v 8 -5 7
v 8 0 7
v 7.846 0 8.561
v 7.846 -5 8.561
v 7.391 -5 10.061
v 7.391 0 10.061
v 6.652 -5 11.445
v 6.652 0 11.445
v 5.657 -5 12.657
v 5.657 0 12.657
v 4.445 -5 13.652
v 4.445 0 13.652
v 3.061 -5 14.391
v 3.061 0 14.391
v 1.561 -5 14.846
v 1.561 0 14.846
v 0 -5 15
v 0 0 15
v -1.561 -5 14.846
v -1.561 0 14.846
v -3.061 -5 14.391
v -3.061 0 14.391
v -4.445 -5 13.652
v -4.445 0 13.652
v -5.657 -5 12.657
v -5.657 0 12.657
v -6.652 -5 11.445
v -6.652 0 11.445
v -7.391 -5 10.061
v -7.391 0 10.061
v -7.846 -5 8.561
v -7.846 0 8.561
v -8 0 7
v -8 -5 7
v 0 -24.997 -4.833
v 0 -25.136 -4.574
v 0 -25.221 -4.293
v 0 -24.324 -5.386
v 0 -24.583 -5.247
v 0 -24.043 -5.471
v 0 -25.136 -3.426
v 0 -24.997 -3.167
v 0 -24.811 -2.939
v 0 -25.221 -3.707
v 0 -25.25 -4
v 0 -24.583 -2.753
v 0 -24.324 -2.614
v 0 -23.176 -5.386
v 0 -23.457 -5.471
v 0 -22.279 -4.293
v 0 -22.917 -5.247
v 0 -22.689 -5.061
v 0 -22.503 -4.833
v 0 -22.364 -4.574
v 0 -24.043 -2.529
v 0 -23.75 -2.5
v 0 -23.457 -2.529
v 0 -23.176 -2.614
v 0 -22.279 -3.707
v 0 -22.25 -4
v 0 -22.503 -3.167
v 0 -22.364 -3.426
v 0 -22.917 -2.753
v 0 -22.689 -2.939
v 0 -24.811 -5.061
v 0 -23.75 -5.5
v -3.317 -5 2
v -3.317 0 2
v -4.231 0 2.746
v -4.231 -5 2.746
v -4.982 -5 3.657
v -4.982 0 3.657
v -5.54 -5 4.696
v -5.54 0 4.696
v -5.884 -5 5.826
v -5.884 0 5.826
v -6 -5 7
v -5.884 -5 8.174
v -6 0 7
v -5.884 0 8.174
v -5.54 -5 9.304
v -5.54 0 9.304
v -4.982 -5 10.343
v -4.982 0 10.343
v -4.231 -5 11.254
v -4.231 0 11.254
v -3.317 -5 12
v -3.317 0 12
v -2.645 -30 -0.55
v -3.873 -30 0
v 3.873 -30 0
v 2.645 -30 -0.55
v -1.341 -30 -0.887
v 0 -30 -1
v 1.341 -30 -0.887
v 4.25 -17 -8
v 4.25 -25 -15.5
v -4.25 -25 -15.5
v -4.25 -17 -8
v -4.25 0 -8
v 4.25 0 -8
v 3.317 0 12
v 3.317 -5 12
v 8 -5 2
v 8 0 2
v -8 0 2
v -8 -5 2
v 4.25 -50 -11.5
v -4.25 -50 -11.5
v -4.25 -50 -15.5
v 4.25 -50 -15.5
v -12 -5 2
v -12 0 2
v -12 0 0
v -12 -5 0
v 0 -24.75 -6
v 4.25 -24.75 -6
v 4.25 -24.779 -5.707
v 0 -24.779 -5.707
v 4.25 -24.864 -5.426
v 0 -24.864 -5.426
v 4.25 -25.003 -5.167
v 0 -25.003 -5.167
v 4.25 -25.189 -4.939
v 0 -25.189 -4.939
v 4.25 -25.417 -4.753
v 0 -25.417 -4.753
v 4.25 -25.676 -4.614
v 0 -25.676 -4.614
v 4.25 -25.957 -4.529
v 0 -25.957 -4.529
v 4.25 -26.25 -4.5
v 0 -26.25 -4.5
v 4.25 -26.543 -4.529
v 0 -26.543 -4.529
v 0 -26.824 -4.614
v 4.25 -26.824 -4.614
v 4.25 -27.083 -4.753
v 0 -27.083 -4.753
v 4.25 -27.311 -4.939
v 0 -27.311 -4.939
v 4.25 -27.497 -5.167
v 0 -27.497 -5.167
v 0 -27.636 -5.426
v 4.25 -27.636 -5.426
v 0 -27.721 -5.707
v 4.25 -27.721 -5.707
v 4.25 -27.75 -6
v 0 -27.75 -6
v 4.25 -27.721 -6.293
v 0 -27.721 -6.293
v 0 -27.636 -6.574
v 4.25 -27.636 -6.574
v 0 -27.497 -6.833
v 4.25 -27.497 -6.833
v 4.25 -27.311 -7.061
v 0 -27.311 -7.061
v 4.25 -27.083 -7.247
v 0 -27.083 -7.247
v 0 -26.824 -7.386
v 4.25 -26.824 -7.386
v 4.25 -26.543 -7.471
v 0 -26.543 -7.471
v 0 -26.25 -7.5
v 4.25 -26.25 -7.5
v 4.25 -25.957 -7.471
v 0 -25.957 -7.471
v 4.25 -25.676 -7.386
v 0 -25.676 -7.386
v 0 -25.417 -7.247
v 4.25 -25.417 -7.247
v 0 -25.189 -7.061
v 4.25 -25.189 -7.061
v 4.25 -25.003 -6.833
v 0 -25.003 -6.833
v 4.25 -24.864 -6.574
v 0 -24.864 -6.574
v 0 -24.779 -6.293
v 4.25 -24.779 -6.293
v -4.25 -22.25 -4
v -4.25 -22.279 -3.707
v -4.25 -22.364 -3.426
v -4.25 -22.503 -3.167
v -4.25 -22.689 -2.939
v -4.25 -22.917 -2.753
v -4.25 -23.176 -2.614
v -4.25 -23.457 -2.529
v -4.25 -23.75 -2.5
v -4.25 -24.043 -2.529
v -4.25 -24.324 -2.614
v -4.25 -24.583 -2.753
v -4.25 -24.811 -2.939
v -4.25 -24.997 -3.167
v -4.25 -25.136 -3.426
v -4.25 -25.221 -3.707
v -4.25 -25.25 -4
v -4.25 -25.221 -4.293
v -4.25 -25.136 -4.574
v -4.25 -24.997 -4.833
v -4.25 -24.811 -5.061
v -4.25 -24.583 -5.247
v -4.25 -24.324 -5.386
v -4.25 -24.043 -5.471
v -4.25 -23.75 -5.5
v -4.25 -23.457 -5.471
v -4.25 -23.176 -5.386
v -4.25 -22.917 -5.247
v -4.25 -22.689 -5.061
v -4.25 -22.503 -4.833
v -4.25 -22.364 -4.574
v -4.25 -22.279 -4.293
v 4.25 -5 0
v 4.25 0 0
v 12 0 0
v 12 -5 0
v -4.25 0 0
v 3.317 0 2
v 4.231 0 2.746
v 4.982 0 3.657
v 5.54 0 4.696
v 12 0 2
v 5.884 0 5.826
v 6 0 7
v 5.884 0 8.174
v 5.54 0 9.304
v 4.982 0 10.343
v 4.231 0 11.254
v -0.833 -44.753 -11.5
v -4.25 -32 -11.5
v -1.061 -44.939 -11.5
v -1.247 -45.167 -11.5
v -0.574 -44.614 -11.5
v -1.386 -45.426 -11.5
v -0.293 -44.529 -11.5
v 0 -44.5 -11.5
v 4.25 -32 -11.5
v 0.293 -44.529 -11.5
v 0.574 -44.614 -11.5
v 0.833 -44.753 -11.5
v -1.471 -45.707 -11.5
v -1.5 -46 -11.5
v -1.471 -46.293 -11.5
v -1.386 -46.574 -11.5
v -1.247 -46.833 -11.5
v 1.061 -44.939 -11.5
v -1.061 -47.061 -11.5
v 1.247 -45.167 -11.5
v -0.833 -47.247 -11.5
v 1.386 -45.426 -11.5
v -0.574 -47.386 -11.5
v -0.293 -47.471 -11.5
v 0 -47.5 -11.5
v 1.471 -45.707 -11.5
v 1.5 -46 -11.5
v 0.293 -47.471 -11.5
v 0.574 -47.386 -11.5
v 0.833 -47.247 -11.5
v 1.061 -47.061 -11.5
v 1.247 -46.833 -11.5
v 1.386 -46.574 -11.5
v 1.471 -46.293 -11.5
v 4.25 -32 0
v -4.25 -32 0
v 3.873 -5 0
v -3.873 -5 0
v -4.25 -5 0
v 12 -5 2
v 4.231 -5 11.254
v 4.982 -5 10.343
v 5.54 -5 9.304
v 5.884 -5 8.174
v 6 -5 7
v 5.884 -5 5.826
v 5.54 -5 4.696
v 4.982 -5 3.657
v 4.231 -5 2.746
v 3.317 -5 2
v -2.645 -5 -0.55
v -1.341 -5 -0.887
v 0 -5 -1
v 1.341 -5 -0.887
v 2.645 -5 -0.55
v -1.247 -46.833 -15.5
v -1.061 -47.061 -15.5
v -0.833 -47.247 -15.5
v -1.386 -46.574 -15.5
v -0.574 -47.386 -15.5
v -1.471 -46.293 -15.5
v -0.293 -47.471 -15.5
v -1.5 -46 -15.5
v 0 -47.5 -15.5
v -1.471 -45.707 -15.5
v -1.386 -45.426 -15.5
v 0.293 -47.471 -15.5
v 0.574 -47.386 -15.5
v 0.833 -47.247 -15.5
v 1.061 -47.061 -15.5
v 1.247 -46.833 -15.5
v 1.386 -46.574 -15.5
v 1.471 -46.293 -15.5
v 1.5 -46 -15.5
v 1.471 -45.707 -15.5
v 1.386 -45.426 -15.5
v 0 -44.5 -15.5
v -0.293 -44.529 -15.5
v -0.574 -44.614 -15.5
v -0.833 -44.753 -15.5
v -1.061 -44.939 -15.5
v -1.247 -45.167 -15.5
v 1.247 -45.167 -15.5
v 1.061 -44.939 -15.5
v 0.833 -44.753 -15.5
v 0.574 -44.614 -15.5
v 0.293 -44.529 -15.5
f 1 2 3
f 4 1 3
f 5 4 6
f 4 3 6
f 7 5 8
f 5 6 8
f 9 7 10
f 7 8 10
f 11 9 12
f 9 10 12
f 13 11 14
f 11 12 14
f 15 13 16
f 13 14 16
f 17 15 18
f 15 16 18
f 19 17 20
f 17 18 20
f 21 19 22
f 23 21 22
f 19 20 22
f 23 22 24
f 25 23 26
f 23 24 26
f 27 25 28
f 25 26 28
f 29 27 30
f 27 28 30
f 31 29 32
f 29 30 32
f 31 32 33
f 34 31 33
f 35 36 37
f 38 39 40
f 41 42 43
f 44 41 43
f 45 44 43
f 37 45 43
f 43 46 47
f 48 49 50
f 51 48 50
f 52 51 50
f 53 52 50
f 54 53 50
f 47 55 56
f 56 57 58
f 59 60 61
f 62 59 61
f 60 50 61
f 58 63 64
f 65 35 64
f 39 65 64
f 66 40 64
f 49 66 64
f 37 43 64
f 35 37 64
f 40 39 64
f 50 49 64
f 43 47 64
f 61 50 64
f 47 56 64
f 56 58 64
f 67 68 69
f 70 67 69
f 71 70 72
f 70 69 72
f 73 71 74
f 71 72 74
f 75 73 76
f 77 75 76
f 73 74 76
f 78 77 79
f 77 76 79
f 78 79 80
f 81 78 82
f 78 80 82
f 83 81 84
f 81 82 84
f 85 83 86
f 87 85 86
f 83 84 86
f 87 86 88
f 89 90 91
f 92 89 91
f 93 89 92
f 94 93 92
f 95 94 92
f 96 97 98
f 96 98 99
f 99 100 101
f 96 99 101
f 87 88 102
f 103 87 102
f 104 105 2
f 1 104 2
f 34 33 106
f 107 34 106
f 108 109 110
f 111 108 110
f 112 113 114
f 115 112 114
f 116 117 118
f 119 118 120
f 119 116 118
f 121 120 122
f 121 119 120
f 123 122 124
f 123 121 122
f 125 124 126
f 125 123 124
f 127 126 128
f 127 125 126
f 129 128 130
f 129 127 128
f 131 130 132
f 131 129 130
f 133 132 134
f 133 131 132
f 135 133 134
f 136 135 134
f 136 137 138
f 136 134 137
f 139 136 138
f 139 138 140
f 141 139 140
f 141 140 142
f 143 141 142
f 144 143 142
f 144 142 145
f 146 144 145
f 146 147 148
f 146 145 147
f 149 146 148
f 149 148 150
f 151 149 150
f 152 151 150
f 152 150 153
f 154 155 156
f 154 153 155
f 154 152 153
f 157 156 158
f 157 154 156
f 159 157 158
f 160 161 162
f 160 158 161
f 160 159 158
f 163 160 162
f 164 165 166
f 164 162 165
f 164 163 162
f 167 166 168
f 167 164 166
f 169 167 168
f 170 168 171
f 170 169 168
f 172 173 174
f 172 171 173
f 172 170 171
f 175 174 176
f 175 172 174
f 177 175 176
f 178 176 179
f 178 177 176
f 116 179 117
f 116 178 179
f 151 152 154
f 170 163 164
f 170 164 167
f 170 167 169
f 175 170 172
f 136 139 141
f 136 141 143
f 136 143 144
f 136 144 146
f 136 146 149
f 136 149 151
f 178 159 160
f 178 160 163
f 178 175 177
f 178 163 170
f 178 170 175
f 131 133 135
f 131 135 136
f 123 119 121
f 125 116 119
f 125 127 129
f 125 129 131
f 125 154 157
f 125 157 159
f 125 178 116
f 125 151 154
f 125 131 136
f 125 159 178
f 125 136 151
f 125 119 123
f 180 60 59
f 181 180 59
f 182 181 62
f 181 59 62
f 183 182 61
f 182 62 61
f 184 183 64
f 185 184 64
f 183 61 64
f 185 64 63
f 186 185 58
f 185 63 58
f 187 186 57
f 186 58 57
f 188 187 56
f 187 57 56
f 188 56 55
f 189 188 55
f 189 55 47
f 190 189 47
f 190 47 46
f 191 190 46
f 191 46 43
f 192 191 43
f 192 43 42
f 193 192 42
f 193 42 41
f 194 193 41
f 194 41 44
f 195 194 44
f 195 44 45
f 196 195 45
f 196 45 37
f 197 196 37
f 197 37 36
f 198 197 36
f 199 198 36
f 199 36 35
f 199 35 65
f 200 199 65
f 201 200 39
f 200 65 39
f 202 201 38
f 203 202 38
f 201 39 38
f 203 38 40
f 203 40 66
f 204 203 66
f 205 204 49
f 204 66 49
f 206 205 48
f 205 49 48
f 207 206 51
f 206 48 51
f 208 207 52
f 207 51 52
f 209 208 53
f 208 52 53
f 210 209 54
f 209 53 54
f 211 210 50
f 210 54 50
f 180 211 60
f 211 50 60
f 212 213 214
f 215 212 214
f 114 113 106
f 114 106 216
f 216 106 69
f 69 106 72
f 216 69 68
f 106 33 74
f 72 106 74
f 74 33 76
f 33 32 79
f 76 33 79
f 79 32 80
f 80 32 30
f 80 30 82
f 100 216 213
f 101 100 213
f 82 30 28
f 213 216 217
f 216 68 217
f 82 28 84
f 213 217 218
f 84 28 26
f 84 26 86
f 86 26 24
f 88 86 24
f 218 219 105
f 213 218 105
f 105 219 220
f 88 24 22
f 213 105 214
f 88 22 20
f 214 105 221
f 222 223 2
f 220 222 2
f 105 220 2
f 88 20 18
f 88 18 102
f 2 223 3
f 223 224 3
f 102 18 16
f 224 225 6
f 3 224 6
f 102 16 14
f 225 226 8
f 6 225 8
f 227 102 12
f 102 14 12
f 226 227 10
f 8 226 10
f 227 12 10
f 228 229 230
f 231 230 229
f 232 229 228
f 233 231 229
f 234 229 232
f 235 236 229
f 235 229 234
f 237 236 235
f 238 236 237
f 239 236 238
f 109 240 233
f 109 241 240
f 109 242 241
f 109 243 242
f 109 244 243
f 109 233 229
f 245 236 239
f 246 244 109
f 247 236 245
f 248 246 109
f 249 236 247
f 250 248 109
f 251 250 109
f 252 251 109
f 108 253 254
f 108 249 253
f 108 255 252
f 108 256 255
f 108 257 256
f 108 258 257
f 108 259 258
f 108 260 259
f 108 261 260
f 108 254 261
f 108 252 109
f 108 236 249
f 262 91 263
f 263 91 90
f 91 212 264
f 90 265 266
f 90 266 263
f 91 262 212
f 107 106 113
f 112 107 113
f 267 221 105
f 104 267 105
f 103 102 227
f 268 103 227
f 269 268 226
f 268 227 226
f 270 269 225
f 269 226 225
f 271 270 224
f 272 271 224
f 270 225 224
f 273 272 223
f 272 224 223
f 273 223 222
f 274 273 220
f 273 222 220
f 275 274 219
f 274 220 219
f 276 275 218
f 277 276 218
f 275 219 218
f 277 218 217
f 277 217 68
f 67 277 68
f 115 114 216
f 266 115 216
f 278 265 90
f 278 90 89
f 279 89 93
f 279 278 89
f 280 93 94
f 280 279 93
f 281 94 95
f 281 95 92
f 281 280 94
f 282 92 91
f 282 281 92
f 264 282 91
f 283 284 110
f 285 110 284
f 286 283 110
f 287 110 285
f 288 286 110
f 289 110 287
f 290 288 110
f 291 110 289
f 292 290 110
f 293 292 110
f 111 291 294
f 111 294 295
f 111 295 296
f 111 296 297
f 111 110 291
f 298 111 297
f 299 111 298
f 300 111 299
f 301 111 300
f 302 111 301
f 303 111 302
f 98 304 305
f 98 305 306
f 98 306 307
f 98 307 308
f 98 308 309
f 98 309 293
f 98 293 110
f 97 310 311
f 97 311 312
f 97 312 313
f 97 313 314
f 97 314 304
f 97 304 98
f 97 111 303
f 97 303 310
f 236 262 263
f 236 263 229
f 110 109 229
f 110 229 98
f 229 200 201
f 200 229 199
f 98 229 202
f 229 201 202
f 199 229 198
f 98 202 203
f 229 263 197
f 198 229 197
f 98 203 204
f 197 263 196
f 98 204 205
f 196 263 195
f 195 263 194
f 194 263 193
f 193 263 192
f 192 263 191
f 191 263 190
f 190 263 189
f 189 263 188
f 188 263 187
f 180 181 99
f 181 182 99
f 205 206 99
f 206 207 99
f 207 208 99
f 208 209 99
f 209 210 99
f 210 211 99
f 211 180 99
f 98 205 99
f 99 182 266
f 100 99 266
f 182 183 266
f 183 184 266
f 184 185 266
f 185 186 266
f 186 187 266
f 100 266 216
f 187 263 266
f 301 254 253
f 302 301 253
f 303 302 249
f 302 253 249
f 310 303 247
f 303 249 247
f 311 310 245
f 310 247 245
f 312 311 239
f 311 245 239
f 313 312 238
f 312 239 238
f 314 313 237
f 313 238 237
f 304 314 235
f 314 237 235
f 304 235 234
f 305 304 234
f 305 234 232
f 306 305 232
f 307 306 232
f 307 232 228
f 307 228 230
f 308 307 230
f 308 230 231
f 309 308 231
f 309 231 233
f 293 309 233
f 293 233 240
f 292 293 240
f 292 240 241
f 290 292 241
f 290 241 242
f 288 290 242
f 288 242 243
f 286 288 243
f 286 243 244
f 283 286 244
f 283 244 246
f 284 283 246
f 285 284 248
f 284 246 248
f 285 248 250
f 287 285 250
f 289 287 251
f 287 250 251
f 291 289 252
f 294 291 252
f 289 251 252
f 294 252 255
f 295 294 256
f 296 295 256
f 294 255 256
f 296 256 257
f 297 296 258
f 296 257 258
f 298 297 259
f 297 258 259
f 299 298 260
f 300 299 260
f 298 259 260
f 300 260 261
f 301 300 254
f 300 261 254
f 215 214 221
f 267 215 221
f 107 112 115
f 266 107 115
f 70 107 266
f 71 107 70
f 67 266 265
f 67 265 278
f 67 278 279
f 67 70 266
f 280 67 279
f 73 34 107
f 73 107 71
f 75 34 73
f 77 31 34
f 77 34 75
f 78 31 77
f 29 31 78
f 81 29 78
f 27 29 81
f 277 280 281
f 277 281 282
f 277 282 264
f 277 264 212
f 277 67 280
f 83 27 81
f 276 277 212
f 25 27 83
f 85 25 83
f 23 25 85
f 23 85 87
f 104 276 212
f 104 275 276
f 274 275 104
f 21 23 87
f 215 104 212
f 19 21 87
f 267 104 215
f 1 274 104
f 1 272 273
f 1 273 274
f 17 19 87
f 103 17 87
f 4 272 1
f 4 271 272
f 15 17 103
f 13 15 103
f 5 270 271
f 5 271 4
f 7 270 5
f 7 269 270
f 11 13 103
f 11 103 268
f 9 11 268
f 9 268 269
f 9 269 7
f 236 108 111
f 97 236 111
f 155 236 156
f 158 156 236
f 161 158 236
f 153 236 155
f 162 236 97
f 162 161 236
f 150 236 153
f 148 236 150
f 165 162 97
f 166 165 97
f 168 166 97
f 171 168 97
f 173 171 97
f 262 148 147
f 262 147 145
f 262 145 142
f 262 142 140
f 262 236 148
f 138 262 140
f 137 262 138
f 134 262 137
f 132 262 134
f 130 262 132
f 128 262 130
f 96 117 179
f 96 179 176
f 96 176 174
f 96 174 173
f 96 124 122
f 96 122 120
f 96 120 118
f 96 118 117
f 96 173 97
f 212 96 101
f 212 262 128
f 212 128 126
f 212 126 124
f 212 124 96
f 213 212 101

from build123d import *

# Parameters (mm, degrees)
F1_DEPTH      = 5
F2_DEPTH      = 32
F3_R          = 1.5
F4_DEPTH      = 25
F5_DEPTH      = 25
F6_R          = 8
F7_DEPTH      = 25
F9_DEPTH      = 4.25
F9_DEPTH_BACK = 4.25
F10_R         = 1.5
F11_DEPTH     = 25


with BuildPart() as f1:
    # F0 (on Front) → F1 (new body)
    with BuildSketch(Plane.XZ):
        with BuildLine():
            Line((-8, 7), (-8, 2))
            Line((-8, 2), (-12, 2))
            Line((-12, 2), (-12, 0))
            Line((-12, 0), (-4.25, 0))
            Line((-4.25, 0), (0, 0))
            Line((0, 0), (4.25, 0))
            Line((4.25, 0), (12, 0))
            Line((12, 0), (12, 2))
            Line((12, 2), (8, 2))
            Line((8, 2), (8, 7))
            ThreePointArc((8, 7), (0, 15), (-8, 7))
        make_face()
        with BuildLine():
            ThreePointArc((3.316625, 12), (6, 7), (3.316625, 2))
            Line((3.316625, 2), (-3.316625, 2))
            ThreePointArc((-3.316625, 2), (-6, 7), (-3.316625, 12))
            Line((-3.316625, 12), (3.316625, 12))
        make_face(mode=Mode.SUBTRACT)
    extrude(amount=F1_DEPTH)

    # F0 (on Front) → F2 (join)
    with BuildSketch(Plane.XZ):
        Polygon((0, 0), (-4.25, 0), (-4.25, -8), (4.25, -8), (4.25, 0), align=None)
    extrude(amount=F2_DEPTH)

    # F3 (on Right) → F4 (cut)
    with BuildSketch(Plane.YZ):
        with Locations((-23.75, -4)):
            Circle(F3_R)
    extrude(amount=-F4_DEPTH, mode=Mode.SUBTRACT)

    # F3 (on Right) → F5 (cut)
    with BuildSketch(Plane.YZ):
        with Locations((-26.25, -6)):
            Circle(F3_R)
    extrude(amount=F5_DEPTH, mode=Mode.SUBTRACT)

    # F6 (on face) → F7 (cut)
    with BuildSketch(Plane.XZ.offset(5)):
        with Locations((0, 7)):
            Circle(F6_R)
    extrude(amount=F7_DEPTH, mode=Mode.SUBTRACT)

    # F8 (on Right) → F9 (join, two sides)
    with BuildSketch(Plane.YZ) as f9_sk:
        Polygon((-32, -8), (-32, -11.5), (-50, -11.5), (-50, -15.5), (-25, -15.5), (-17, -8), align=None)
    extrude(amount=F9_DEPTH)
    extrude(f9_sk.sketch, amount=-F9_DEPTH_BACK)

    # F10 (on face) → F11 (cut)
    with BuildSketch(Plane.XY.offset(-11.5)):
        with Locations((0, -46)):
            Circle(F10_R)
    extrude(amount=-F11_DEPTH, mode=Mode.SUBTRACT)


solid = f1.part
